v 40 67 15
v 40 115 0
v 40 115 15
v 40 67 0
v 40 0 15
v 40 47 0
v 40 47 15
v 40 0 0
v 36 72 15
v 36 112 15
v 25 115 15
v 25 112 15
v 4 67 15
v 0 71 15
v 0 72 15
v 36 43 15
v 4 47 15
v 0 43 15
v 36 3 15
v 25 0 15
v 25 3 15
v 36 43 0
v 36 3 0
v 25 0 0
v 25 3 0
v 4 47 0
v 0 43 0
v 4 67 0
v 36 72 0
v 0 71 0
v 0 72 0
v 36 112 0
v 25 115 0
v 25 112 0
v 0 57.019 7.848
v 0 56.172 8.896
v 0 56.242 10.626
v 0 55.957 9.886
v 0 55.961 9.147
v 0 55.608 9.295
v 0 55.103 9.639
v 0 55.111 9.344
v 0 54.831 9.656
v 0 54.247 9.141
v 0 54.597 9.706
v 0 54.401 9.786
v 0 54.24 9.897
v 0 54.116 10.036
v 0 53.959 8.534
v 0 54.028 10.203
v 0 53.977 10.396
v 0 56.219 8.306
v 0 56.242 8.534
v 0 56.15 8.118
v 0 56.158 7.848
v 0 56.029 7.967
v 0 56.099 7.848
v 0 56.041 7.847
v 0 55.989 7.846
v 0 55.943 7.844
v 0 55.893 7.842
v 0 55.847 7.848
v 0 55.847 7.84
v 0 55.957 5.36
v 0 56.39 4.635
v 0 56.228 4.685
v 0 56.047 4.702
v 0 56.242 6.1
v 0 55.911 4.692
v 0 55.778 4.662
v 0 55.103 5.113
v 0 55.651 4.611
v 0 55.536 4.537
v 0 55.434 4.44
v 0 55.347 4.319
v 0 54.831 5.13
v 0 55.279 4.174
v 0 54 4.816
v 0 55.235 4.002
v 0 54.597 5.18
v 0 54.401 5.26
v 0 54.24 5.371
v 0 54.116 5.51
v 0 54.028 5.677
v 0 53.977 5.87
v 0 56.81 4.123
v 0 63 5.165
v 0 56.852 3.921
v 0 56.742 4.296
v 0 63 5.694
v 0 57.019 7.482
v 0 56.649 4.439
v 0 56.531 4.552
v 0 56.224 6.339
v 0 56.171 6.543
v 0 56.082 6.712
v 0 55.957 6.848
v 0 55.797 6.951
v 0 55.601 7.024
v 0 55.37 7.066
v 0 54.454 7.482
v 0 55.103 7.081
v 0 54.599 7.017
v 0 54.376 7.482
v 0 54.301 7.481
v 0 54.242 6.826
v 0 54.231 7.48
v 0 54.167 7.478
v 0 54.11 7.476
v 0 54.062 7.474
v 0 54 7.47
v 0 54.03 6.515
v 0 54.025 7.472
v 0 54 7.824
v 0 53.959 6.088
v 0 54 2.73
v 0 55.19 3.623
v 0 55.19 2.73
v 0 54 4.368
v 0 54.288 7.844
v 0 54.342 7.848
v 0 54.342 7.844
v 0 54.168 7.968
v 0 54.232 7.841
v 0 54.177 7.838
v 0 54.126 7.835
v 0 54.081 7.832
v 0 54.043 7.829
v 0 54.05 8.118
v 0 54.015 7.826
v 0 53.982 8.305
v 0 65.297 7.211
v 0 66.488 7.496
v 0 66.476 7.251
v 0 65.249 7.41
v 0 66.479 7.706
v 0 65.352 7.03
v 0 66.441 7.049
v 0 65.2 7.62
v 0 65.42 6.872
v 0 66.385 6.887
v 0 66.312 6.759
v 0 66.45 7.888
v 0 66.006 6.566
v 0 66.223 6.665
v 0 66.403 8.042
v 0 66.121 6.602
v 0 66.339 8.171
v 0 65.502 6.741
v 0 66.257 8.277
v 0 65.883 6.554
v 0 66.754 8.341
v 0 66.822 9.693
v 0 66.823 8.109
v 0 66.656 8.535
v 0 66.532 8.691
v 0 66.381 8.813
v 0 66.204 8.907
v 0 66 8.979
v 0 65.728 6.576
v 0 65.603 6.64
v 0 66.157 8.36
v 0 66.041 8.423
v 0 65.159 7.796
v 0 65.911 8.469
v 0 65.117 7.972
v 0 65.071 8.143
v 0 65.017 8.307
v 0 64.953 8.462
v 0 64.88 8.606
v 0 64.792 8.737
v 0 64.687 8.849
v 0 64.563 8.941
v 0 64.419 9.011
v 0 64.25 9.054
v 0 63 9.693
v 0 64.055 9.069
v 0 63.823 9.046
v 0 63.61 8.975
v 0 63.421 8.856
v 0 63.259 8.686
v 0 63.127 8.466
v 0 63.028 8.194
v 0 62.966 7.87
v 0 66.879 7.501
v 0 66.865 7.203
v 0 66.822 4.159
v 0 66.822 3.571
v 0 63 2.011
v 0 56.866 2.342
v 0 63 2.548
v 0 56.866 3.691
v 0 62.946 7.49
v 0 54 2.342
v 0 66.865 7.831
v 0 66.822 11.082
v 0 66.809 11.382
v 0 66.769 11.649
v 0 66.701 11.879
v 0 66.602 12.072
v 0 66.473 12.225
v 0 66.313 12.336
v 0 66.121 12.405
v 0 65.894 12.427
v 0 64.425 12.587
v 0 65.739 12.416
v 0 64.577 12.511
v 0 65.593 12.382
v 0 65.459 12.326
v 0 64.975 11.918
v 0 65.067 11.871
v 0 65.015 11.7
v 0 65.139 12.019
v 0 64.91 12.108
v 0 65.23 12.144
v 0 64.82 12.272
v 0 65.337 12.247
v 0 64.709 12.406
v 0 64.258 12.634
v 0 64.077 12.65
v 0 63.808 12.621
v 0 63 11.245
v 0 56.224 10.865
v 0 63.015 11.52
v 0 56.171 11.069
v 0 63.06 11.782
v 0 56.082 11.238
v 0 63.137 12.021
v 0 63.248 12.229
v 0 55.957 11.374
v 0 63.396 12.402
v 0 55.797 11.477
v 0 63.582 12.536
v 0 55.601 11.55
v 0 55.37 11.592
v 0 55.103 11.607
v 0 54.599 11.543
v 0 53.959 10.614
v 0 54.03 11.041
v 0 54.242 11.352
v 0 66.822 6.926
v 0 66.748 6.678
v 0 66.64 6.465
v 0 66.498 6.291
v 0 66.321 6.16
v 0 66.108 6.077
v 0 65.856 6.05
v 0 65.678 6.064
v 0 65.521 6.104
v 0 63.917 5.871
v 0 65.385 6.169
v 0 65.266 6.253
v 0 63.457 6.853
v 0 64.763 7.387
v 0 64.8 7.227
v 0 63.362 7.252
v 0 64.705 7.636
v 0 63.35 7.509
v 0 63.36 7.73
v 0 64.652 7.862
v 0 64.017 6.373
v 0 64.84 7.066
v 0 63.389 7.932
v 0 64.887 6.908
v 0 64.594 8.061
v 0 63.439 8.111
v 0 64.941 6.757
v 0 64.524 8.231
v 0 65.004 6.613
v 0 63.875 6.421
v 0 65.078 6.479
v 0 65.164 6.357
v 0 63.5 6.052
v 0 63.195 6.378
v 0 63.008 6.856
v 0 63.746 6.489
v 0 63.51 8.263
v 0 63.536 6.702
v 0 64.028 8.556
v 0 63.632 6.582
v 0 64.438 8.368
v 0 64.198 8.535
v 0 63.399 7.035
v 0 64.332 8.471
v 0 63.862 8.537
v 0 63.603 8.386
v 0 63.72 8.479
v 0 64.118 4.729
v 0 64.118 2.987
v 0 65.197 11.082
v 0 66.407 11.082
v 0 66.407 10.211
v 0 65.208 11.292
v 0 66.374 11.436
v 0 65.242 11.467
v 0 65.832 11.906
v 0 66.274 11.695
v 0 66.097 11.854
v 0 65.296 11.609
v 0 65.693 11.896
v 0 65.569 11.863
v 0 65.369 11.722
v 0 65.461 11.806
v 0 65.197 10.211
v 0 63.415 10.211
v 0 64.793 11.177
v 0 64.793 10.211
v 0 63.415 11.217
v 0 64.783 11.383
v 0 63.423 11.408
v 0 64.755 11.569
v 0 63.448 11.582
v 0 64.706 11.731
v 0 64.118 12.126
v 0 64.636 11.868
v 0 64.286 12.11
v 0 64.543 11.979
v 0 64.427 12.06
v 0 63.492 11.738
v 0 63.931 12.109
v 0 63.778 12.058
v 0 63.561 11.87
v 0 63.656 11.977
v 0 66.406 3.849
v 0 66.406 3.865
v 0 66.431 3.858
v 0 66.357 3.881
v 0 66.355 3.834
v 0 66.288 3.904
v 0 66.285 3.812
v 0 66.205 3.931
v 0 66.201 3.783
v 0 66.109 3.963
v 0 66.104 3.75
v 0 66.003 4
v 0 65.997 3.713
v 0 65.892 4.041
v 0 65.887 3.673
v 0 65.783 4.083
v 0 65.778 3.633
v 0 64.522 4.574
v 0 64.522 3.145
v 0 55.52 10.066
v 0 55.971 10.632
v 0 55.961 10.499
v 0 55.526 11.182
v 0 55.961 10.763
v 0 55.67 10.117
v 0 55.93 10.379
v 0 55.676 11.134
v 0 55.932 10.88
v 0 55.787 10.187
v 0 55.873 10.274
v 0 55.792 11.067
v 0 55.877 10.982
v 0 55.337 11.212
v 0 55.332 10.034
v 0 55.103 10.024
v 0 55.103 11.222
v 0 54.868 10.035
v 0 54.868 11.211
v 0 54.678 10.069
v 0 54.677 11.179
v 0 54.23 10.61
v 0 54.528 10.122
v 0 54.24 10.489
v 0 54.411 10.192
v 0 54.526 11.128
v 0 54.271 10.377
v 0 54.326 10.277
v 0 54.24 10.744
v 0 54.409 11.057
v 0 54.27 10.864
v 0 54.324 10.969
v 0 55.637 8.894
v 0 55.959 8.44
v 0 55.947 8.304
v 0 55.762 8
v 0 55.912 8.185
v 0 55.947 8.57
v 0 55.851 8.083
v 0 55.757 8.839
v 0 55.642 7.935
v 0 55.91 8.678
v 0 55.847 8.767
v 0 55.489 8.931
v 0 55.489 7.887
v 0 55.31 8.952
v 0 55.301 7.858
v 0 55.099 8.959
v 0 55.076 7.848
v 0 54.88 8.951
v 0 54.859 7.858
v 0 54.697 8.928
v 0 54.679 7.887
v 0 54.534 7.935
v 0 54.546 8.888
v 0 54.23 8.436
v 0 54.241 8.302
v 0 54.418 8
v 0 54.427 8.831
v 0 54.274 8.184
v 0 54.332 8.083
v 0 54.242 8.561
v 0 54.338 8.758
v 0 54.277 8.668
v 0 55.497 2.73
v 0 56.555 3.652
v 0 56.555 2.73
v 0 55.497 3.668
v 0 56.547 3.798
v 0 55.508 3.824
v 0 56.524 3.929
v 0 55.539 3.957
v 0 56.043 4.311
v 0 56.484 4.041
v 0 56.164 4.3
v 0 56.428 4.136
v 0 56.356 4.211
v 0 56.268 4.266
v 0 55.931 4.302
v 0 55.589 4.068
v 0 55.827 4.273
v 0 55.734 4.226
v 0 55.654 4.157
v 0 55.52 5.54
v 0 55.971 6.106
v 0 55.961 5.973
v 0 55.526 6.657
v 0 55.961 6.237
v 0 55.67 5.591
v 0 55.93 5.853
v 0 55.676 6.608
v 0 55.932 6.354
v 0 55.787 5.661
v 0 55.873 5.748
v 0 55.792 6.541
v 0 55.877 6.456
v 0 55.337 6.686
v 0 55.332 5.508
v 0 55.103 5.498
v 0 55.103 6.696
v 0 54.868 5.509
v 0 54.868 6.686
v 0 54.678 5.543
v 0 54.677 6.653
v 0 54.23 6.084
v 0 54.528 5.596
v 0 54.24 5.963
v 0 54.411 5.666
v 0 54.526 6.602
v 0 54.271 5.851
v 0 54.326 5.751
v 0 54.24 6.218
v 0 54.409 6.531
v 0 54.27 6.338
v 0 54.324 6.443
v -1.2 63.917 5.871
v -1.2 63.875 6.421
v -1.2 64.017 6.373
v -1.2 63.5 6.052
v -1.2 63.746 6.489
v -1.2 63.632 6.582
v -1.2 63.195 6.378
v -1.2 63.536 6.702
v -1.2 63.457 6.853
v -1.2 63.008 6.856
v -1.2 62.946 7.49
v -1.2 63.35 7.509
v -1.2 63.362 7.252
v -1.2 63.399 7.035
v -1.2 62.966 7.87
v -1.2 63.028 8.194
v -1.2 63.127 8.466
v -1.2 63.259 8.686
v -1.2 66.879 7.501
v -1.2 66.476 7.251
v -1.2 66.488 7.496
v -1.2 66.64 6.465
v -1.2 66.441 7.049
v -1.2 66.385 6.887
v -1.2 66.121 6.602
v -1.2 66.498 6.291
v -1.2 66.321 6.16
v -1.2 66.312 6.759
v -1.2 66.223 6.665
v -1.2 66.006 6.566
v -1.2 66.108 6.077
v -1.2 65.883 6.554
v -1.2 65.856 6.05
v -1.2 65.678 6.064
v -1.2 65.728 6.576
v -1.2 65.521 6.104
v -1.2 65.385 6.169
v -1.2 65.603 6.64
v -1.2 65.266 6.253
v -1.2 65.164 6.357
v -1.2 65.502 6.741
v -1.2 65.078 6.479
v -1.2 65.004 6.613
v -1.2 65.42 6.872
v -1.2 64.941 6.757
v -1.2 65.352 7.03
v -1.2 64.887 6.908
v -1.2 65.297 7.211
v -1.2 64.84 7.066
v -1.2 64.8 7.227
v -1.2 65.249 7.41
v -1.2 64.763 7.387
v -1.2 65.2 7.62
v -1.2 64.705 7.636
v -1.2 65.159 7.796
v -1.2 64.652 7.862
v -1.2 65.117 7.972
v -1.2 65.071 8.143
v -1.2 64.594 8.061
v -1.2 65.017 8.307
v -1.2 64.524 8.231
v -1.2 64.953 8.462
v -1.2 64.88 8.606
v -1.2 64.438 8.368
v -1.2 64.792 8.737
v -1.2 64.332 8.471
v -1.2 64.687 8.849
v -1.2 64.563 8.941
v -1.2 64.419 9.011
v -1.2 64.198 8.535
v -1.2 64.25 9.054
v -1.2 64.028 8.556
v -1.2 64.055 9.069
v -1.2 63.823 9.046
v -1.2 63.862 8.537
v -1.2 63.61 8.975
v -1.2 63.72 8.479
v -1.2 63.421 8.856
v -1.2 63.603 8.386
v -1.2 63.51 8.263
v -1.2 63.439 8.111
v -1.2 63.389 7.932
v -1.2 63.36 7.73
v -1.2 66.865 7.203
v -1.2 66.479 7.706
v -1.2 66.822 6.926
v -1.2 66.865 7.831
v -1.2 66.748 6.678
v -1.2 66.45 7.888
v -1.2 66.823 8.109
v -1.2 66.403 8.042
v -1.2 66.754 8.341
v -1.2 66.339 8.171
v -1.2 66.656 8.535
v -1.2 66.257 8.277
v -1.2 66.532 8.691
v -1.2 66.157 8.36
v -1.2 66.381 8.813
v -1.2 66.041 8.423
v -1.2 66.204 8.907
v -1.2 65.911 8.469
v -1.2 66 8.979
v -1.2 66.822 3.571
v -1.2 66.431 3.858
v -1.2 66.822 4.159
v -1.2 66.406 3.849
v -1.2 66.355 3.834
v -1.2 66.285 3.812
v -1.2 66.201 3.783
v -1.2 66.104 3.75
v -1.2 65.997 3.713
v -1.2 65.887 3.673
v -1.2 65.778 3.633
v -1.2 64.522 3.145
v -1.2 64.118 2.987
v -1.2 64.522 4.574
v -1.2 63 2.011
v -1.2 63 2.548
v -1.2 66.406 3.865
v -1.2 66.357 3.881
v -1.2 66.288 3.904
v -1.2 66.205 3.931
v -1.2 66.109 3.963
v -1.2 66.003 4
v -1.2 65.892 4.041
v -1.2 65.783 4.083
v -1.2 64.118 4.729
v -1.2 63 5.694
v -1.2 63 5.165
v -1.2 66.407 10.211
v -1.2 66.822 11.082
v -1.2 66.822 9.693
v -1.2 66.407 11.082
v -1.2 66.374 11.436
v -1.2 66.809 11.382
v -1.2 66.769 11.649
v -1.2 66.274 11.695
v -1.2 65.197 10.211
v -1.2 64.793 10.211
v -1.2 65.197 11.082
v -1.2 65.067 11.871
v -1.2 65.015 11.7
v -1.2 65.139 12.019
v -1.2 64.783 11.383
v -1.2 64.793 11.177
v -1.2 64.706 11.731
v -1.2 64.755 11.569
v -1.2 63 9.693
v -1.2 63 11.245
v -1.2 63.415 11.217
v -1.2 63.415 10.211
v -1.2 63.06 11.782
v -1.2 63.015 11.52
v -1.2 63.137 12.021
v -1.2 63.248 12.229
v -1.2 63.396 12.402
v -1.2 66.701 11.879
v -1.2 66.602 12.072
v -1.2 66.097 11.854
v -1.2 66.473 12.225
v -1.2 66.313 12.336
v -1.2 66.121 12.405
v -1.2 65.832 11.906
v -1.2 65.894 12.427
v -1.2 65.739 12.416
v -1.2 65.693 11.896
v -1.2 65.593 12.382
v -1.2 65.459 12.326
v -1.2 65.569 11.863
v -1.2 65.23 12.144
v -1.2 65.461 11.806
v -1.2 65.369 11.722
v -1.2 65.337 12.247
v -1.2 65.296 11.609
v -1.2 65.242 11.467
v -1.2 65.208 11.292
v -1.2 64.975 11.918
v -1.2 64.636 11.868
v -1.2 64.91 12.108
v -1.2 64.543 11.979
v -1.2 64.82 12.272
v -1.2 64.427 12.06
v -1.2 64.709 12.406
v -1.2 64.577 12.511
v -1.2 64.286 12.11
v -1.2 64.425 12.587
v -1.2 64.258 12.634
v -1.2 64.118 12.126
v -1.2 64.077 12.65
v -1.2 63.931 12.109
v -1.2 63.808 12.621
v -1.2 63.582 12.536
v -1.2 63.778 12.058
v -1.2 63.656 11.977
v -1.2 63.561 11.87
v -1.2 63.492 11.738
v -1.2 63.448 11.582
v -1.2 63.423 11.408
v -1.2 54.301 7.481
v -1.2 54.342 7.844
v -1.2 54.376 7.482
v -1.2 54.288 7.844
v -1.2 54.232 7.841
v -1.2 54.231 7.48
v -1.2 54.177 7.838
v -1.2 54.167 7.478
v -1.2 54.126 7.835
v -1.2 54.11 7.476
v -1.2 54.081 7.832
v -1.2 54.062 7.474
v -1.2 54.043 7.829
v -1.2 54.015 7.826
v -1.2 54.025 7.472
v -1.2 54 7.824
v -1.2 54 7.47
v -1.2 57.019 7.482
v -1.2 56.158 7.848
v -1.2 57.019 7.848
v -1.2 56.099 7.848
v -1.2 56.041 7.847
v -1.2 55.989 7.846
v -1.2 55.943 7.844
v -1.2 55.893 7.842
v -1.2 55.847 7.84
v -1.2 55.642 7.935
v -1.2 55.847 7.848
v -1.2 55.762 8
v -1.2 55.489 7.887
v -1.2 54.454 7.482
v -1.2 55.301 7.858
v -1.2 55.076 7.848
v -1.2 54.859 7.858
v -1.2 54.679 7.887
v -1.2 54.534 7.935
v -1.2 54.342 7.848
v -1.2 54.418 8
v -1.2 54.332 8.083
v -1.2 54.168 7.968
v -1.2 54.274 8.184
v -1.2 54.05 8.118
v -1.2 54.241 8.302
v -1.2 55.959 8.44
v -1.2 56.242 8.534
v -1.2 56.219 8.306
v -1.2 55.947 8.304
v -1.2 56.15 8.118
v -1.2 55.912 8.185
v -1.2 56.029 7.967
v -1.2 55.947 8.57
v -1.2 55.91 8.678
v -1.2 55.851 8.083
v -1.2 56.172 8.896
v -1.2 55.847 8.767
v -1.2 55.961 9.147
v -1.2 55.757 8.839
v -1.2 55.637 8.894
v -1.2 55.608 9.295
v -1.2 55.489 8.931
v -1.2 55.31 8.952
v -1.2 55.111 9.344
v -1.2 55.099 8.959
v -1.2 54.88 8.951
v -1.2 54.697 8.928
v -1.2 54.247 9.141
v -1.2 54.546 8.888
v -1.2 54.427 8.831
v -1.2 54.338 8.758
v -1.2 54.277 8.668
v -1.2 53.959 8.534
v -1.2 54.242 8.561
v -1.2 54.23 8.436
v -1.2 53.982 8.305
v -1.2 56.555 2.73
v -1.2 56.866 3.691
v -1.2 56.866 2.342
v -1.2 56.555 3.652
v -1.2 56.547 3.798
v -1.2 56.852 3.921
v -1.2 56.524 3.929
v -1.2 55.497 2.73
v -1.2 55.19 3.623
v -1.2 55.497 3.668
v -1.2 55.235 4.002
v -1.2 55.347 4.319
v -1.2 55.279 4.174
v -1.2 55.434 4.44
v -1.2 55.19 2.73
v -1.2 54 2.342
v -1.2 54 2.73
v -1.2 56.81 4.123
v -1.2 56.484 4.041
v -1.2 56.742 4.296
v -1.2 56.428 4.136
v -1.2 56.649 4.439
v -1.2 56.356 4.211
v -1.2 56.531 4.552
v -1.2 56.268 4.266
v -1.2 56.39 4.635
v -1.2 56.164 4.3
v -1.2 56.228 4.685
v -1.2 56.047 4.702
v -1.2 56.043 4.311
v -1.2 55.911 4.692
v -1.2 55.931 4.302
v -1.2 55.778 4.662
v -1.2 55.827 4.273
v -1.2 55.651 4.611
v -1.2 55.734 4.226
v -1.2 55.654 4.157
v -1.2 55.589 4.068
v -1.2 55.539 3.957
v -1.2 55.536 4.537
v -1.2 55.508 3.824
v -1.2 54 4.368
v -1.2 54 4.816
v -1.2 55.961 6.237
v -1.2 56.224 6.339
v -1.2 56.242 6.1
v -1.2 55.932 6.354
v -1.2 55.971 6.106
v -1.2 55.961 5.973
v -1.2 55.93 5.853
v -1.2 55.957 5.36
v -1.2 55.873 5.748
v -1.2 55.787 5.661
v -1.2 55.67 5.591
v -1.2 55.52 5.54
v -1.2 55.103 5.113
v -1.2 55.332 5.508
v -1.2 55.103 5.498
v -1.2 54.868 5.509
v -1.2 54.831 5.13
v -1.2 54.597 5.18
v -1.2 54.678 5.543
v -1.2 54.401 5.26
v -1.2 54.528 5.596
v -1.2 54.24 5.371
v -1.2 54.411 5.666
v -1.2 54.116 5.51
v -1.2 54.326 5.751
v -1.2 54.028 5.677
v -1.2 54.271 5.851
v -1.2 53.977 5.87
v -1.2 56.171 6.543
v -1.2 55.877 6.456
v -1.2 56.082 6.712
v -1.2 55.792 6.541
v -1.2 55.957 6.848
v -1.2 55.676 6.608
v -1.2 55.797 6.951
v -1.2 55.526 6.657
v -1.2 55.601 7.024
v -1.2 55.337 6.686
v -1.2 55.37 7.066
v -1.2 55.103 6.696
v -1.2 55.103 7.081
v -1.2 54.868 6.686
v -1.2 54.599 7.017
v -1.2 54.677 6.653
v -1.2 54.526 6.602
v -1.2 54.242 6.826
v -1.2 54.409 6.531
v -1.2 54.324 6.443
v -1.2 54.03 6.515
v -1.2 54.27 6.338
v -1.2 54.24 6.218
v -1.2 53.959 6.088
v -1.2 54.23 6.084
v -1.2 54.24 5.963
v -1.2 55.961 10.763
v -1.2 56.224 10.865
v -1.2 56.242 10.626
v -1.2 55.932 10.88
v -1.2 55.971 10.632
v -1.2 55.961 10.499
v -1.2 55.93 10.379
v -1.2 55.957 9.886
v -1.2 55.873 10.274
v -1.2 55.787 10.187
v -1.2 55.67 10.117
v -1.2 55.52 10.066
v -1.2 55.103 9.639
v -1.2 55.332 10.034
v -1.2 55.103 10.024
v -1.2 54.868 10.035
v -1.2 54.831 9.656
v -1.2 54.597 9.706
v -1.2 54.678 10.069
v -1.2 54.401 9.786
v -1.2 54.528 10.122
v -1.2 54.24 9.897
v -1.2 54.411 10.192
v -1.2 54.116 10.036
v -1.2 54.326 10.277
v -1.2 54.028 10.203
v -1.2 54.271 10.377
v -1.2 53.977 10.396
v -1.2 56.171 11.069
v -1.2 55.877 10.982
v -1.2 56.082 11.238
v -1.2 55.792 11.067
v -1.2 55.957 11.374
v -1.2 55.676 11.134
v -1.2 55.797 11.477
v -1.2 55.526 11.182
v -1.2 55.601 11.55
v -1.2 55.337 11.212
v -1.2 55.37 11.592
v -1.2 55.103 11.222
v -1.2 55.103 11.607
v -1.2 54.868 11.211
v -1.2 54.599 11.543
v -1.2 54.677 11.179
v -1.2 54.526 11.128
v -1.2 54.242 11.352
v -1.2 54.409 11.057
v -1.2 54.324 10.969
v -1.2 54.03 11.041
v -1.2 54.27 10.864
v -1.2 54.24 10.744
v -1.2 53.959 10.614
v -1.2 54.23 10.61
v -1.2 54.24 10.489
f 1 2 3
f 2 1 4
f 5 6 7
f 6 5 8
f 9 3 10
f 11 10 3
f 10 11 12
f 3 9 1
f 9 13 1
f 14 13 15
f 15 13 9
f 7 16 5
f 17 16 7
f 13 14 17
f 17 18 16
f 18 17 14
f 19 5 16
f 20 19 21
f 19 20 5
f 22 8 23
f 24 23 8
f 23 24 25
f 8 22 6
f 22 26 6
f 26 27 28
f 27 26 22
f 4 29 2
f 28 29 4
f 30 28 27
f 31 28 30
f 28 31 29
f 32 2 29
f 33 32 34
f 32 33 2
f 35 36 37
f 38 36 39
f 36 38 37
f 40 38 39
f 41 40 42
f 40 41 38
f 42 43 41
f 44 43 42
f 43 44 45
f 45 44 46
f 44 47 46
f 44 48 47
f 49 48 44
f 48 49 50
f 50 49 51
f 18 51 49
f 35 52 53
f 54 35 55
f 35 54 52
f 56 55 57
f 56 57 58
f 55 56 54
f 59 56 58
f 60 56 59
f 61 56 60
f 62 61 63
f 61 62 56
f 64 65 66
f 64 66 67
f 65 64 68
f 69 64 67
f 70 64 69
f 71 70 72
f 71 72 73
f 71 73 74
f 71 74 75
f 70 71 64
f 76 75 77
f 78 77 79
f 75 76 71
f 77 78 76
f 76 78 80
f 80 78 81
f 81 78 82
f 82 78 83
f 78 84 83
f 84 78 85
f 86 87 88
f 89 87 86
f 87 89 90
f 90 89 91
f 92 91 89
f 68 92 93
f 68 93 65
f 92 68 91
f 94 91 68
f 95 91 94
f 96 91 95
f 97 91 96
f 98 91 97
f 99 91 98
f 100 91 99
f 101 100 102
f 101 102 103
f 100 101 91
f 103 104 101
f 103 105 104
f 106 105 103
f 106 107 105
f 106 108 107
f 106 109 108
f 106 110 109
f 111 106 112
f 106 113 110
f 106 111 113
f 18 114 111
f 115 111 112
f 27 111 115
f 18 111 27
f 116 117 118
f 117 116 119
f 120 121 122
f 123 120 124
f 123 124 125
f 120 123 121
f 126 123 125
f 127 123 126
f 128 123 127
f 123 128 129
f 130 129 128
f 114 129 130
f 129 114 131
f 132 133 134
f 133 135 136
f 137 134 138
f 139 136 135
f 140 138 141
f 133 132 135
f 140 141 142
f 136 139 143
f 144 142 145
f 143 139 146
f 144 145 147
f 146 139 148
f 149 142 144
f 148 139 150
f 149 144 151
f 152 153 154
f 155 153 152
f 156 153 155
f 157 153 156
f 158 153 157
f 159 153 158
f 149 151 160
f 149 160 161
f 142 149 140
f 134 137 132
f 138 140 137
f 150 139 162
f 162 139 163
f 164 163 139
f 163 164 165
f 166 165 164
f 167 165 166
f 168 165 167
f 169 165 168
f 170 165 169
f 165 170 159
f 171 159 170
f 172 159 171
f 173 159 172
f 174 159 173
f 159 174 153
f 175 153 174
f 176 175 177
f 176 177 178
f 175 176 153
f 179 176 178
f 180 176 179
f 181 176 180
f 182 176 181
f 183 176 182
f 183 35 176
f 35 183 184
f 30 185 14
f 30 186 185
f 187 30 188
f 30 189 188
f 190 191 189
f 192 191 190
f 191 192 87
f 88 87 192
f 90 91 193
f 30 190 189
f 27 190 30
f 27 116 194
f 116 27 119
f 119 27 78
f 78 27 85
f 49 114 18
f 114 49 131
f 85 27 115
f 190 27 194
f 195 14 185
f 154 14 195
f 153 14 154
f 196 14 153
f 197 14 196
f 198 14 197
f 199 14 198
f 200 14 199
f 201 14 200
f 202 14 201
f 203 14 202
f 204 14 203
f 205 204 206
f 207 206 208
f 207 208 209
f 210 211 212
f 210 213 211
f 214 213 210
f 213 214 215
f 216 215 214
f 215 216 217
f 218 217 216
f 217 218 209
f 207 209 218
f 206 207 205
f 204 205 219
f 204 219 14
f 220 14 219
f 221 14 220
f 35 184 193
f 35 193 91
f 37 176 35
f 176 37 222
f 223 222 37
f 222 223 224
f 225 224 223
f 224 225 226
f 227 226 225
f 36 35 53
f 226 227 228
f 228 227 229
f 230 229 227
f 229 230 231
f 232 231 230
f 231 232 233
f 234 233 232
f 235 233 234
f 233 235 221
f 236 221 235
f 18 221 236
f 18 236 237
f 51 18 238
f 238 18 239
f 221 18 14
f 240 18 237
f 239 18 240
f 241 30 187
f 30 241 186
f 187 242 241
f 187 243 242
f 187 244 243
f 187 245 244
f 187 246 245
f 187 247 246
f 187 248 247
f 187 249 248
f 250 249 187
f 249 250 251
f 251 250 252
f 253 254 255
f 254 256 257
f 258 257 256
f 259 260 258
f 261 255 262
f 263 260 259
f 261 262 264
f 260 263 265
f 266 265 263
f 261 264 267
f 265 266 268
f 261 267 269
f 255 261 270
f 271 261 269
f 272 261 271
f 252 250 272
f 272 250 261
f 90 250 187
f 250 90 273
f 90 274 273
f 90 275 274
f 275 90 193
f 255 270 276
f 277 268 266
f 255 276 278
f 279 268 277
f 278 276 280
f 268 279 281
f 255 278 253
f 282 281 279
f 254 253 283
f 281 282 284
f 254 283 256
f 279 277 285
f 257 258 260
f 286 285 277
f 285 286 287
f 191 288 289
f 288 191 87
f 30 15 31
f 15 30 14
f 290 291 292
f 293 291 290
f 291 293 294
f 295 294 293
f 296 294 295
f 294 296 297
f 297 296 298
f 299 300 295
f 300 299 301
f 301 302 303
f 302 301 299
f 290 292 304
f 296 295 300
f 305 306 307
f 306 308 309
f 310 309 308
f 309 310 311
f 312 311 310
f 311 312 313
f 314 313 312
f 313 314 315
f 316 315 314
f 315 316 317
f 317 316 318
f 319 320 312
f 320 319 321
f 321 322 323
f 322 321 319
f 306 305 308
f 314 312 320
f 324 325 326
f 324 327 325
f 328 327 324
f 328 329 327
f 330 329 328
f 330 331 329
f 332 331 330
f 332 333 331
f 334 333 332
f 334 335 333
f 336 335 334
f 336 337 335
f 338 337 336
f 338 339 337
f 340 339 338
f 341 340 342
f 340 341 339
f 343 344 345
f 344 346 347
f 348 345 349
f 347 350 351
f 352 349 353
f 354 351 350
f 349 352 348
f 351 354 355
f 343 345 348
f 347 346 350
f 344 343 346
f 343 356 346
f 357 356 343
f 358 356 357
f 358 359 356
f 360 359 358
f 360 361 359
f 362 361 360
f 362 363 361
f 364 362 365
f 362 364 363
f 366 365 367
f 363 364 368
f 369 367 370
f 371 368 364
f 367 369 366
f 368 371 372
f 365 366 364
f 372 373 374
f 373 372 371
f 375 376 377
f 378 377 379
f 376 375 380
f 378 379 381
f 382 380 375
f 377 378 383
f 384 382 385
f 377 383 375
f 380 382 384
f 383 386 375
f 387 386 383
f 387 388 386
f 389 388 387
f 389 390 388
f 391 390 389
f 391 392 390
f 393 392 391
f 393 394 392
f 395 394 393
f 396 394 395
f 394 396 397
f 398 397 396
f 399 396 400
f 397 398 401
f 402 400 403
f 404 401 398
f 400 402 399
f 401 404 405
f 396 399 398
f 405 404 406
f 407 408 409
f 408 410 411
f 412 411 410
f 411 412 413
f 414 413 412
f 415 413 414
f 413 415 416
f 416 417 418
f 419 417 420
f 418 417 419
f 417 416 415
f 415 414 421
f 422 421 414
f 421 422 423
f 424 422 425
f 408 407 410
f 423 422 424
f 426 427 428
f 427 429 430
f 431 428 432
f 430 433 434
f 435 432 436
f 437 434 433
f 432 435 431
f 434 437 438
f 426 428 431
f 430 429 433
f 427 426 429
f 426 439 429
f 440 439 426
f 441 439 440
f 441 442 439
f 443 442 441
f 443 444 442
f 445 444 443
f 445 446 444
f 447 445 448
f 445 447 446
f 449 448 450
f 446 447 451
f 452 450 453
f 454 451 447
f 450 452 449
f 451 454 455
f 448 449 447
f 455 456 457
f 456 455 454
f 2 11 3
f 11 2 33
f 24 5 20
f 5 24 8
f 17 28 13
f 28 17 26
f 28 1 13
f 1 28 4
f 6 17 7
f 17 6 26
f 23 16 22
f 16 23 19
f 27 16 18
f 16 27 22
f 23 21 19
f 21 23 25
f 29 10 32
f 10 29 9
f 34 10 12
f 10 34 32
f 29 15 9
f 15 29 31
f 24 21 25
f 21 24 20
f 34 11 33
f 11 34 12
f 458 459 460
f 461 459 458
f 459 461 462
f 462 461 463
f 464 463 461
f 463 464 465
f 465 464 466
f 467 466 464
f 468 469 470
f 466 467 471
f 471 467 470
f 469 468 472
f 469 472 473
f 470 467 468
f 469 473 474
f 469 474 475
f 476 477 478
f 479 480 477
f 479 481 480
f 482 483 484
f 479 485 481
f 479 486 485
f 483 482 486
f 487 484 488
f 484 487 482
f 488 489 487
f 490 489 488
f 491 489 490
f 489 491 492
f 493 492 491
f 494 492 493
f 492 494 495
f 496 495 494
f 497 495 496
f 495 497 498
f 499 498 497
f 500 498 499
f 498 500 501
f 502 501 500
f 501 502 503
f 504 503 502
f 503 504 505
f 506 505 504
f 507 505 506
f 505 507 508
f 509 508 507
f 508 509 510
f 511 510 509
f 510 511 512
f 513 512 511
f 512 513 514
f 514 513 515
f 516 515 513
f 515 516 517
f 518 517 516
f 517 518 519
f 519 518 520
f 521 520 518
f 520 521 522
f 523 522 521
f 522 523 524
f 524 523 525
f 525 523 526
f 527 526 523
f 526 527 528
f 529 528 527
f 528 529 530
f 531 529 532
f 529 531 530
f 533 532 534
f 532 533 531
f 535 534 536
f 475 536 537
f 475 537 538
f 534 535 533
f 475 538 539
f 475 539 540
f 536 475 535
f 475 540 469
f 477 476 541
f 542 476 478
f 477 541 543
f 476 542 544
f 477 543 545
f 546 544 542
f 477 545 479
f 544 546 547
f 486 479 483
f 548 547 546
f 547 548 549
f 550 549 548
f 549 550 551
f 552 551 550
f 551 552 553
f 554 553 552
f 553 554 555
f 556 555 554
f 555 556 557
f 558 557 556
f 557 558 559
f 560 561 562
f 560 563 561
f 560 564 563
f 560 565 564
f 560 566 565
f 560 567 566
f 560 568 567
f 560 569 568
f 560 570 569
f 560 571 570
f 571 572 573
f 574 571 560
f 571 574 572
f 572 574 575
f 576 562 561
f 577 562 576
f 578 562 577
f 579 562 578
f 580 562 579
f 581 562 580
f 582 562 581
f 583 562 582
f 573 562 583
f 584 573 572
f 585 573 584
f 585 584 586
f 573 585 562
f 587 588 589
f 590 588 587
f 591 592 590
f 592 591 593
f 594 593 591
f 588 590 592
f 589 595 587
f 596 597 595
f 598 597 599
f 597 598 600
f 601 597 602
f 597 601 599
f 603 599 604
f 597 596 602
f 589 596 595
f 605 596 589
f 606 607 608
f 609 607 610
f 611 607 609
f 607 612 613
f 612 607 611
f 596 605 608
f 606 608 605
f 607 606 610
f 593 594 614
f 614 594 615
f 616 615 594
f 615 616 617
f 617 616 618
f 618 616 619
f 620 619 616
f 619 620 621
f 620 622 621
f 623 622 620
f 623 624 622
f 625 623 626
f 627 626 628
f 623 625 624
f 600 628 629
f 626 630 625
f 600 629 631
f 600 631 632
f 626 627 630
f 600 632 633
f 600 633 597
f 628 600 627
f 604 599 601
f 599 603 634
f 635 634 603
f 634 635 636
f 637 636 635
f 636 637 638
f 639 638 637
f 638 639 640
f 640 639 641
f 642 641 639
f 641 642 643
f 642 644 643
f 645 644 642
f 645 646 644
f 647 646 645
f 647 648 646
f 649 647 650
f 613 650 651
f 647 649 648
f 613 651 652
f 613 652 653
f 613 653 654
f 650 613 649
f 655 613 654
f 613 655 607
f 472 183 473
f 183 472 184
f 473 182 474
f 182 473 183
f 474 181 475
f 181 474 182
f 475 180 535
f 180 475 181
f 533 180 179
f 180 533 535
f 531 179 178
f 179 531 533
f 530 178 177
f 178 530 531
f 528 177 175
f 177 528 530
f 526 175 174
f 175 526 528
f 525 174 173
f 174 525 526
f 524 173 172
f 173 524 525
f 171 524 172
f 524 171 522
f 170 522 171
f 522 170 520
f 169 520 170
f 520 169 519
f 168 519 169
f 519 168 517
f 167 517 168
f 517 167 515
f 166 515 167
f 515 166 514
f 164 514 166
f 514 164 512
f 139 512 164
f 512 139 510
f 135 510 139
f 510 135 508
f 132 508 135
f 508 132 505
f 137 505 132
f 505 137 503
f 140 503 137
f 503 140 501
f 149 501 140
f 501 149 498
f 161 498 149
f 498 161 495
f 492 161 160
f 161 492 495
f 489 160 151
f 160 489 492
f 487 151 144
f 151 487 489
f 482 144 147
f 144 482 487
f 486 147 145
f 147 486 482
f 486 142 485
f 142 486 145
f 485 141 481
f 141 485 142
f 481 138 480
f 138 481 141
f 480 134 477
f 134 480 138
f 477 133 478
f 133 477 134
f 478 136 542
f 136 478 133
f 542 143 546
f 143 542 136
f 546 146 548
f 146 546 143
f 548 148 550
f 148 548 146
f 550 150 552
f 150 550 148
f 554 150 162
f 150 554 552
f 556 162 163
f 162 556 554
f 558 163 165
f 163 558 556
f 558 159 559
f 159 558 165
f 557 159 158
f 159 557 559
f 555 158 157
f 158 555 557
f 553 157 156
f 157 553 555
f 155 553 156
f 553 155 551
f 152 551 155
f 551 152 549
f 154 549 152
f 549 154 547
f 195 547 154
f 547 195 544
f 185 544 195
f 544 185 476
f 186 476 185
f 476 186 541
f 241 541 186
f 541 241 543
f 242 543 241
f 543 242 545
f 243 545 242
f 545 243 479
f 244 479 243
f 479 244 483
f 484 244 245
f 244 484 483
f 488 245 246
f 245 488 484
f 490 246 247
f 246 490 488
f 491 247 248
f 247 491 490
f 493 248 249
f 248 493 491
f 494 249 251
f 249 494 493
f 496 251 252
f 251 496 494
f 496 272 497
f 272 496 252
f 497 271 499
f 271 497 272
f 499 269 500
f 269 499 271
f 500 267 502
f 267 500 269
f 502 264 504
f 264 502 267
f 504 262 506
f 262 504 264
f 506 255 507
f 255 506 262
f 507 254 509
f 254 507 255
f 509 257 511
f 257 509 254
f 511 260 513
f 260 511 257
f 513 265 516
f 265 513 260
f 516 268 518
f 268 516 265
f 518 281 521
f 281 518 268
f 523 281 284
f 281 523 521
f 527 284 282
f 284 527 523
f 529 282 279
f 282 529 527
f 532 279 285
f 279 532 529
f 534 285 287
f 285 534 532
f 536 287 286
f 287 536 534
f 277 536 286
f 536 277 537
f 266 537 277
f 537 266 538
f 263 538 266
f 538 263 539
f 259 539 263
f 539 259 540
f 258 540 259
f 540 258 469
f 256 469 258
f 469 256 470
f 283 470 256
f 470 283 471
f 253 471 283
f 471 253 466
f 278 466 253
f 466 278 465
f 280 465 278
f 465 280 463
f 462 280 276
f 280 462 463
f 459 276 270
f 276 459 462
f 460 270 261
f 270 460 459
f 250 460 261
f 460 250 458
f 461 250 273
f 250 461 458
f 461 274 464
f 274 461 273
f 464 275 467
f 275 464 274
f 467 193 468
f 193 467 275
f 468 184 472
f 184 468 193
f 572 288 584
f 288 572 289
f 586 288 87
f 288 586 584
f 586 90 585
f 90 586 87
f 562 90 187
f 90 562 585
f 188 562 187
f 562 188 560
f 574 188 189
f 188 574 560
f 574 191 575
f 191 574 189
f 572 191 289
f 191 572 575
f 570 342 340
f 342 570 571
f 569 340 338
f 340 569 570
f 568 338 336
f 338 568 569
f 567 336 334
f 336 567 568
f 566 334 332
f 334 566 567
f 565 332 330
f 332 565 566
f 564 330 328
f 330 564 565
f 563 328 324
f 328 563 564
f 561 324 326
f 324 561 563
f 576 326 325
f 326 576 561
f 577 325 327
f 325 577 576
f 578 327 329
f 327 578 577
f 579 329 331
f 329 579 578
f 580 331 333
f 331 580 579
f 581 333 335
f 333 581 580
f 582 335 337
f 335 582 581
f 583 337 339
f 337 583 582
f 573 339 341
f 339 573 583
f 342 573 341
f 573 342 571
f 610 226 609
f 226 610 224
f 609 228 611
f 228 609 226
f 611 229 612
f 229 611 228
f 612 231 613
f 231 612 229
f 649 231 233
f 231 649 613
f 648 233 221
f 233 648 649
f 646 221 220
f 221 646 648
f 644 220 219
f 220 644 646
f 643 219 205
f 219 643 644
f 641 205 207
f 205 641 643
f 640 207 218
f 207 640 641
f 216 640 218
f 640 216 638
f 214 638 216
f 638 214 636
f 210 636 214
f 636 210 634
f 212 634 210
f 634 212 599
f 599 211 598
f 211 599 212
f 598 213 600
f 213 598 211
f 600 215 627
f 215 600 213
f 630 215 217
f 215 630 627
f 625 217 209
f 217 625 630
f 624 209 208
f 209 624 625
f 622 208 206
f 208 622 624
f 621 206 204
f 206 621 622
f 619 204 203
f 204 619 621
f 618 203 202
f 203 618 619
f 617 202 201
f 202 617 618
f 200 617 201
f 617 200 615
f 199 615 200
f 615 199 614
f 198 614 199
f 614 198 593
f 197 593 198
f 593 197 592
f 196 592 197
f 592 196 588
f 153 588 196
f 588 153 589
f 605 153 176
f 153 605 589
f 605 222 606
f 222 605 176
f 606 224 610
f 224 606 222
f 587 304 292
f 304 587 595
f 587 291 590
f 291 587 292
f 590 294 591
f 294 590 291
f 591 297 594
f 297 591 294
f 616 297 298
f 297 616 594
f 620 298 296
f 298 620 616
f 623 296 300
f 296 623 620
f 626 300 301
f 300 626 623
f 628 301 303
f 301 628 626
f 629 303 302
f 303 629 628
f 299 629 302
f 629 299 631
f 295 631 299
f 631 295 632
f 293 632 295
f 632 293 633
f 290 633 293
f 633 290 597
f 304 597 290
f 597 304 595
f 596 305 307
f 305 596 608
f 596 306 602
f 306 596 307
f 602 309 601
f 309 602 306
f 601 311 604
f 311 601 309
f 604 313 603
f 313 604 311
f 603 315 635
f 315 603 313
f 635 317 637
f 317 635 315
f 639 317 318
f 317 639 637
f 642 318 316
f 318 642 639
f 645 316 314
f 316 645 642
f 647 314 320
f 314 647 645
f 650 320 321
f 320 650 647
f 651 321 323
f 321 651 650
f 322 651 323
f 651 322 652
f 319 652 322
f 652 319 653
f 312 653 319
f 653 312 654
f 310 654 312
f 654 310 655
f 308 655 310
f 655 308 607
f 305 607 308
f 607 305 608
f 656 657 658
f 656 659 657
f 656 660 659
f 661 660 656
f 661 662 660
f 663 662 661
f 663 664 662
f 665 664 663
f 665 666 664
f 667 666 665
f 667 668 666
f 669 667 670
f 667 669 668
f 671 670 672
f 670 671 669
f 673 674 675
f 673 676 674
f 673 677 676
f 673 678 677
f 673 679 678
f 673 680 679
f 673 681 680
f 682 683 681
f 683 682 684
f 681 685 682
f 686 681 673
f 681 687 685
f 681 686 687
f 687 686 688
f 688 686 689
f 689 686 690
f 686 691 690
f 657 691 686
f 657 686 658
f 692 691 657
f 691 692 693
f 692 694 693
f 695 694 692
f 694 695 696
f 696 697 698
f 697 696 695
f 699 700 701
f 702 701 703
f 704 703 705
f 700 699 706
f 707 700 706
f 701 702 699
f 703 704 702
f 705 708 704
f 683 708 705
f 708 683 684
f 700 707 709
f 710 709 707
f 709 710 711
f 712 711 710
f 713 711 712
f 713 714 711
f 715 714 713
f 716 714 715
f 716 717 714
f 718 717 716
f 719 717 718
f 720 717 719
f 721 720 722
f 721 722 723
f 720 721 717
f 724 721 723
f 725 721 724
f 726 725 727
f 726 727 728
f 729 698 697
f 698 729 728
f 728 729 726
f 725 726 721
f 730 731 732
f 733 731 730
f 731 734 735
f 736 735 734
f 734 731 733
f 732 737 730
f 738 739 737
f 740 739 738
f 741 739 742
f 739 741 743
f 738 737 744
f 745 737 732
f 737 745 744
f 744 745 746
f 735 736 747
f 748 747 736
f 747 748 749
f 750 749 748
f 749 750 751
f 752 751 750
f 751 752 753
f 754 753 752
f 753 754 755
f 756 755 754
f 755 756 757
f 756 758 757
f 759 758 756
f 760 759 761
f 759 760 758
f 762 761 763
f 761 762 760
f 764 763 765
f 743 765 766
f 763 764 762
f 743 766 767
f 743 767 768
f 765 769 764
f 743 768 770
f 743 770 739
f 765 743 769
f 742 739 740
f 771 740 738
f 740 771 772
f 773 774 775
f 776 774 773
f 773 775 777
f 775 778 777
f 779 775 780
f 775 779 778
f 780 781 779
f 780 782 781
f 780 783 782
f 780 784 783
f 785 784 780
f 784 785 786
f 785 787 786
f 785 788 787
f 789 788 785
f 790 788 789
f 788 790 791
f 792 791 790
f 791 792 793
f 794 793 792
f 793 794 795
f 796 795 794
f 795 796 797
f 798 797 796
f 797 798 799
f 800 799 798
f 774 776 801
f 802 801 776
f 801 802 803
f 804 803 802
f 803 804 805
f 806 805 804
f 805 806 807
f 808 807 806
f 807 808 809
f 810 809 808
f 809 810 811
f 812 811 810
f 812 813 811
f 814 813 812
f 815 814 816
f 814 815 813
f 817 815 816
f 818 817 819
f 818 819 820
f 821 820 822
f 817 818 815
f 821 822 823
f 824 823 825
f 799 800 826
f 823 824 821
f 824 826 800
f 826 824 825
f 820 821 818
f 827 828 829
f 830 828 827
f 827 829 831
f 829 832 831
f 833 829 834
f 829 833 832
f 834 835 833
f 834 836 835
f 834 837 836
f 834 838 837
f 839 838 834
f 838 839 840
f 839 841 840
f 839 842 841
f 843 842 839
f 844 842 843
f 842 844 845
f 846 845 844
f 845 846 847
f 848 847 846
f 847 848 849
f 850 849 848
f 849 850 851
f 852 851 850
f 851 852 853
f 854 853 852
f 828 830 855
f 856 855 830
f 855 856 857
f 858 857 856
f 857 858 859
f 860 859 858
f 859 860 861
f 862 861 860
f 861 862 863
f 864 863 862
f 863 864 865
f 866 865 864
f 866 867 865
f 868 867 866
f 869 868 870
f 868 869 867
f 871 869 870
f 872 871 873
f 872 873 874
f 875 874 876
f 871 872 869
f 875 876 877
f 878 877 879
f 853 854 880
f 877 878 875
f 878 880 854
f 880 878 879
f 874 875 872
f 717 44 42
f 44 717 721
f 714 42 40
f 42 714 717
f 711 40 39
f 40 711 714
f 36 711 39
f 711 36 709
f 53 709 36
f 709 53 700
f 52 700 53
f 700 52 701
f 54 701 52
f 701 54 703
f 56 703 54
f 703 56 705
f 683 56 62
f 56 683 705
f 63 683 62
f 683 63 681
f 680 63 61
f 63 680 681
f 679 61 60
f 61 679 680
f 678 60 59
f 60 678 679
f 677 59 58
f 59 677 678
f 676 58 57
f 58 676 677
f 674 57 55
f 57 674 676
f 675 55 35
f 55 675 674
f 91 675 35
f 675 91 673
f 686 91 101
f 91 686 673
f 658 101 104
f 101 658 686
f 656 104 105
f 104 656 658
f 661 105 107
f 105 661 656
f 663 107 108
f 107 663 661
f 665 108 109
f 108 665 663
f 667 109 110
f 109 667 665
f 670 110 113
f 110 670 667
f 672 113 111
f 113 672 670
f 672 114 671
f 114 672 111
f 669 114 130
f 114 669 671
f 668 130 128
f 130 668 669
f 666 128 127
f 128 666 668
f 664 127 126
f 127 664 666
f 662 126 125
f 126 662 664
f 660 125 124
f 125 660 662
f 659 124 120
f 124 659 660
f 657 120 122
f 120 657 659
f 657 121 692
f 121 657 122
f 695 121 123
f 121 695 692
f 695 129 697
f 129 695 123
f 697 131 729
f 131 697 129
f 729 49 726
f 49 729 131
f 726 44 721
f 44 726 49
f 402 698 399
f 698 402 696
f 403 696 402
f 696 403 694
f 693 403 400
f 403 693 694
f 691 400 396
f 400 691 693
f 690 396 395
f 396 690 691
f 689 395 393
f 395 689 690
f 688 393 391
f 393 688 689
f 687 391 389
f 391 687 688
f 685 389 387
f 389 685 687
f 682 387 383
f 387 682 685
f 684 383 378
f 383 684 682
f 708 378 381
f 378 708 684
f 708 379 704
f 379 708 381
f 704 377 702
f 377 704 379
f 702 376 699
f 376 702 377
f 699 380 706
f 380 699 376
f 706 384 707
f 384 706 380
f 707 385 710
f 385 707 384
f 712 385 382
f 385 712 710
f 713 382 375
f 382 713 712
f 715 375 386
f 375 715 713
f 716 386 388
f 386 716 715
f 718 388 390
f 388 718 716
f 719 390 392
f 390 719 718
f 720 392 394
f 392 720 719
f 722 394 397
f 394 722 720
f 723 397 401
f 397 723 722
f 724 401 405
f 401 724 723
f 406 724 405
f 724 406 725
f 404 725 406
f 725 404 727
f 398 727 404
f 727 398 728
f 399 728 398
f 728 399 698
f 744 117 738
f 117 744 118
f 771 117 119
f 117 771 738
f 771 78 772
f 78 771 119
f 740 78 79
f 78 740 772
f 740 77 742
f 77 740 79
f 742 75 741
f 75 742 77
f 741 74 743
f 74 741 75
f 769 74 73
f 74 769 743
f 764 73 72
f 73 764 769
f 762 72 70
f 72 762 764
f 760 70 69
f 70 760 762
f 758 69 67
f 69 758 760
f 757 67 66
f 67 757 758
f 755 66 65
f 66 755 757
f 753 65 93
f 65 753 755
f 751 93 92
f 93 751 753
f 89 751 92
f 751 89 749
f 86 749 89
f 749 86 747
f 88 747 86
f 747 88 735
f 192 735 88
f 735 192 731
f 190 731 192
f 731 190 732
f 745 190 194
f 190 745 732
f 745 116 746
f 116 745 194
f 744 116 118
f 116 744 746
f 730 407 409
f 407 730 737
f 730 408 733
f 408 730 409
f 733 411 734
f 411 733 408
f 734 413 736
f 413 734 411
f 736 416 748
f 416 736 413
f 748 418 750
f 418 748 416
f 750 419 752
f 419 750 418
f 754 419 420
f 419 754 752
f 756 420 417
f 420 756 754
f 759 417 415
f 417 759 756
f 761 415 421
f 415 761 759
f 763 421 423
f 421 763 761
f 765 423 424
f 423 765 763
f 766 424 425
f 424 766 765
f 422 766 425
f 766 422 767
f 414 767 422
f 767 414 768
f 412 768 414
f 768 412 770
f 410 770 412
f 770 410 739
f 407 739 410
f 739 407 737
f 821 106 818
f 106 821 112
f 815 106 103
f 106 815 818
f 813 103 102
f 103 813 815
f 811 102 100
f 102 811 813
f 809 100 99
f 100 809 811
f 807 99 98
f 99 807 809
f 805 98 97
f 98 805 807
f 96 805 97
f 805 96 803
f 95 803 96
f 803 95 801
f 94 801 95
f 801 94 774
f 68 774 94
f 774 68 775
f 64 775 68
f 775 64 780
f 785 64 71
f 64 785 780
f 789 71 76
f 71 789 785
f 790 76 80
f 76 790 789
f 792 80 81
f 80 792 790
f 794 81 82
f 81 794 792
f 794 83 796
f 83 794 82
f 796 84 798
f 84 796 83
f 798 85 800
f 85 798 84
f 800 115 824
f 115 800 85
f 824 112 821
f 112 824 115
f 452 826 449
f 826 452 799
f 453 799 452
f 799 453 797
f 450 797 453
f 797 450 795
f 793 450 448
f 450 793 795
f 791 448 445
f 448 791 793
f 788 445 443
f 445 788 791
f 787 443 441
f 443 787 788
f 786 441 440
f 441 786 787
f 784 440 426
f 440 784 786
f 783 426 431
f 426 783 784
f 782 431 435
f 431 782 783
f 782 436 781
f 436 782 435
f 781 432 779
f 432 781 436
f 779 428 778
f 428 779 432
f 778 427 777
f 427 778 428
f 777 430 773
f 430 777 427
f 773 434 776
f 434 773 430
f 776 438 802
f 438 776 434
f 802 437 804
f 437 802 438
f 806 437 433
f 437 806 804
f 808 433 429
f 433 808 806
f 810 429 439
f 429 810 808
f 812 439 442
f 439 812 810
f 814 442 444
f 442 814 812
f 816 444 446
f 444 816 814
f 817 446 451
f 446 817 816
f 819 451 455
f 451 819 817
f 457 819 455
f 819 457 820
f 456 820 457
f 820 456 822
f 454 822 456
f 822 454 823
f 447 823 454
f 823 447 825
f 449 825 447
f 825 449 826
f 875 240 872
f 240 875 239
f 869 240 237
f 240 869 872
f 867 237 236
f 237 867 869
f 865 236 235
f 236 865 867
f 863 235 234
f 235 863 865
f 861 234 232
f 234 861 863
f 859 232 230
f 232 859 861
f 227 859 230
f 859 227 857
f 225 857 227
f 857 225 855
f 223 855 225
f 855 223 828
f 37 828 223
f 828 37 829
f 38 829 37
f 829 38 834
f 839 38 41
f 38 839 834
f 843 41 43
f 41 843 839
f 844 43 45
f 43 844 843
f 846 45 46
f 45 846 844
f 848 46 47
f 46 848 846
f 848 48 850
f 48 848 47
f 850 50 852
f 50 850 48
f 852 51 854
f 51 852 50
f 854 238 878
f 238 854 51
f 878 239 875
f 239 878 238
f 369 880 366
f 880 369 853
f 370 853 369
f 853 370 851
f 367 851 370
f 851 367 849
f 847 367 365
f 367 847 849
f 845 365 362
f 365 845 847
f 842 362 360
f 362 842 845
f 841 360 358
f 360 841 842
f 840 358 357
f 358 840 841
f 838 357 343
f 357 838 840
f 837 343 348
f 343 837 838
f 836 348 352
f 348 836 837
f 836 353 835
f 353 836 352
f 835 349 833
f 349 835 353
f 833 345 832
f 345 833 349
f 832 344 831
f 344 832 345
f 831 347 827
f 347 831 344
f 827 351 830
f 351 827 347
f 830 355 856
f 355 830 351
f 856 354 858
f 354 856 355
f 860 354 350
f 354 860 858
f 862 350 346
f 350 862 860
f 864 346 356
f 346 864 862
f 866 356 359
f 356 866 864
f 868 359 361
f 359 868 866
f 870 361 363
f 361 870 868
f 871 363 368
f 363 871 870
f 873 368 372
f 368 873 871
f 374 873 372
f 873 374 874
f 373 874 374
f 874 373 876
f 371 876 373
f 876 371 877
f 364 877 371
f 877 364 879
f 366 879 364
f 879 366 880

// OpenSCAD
render(convexity = 1) 
{
	difference() 
	{
		cube(center = false,size = [40,115,15],  $fn=100 );
		translate([4,47,0]) cube(center = false,size = [38,20,22],  $fn=100 );
		translate([-2,3,0]) cube(center = false,size = [38,40,22],  $fn=100 );
		//#translate([0,70,0]) cube(center = false,size = [40,10,22],  $fn=100 );
        translate([-40,26,0]) cube(center = false,size = [40,45,22],  $fn=100 );
        
		//#translate([20,0,0]) cube(center = false,size = [40,20,22],  $fn=100 );
        
        translate([-2,72,0]) cube(center = false,size = [38,40,22],  $fn=100 );
        
        translate([0,0,0]) cube(center = false,size = [25,3,22],  $fn=100 );//left trim
        translate([0,112,0]) cube(center = false,size = [25,3,22],  $fn=100 );//right trim
	}
		translate([0,63,0])
		{
			rotate([0,360-90,0])
				translate([2,0,0]) 
				{
					linear_extrude(height = 1.2)
					{
						#text(text="ASB",size=4);
					}
				}
		}
		translate([0,54,0])
		{
			rotate([0,360-90,0])
				translate([2,0,0]) 
				{
					linear_extrude(height = 1.2)
					{
						text("Robo",size=3);
					}
				}
		}
}
